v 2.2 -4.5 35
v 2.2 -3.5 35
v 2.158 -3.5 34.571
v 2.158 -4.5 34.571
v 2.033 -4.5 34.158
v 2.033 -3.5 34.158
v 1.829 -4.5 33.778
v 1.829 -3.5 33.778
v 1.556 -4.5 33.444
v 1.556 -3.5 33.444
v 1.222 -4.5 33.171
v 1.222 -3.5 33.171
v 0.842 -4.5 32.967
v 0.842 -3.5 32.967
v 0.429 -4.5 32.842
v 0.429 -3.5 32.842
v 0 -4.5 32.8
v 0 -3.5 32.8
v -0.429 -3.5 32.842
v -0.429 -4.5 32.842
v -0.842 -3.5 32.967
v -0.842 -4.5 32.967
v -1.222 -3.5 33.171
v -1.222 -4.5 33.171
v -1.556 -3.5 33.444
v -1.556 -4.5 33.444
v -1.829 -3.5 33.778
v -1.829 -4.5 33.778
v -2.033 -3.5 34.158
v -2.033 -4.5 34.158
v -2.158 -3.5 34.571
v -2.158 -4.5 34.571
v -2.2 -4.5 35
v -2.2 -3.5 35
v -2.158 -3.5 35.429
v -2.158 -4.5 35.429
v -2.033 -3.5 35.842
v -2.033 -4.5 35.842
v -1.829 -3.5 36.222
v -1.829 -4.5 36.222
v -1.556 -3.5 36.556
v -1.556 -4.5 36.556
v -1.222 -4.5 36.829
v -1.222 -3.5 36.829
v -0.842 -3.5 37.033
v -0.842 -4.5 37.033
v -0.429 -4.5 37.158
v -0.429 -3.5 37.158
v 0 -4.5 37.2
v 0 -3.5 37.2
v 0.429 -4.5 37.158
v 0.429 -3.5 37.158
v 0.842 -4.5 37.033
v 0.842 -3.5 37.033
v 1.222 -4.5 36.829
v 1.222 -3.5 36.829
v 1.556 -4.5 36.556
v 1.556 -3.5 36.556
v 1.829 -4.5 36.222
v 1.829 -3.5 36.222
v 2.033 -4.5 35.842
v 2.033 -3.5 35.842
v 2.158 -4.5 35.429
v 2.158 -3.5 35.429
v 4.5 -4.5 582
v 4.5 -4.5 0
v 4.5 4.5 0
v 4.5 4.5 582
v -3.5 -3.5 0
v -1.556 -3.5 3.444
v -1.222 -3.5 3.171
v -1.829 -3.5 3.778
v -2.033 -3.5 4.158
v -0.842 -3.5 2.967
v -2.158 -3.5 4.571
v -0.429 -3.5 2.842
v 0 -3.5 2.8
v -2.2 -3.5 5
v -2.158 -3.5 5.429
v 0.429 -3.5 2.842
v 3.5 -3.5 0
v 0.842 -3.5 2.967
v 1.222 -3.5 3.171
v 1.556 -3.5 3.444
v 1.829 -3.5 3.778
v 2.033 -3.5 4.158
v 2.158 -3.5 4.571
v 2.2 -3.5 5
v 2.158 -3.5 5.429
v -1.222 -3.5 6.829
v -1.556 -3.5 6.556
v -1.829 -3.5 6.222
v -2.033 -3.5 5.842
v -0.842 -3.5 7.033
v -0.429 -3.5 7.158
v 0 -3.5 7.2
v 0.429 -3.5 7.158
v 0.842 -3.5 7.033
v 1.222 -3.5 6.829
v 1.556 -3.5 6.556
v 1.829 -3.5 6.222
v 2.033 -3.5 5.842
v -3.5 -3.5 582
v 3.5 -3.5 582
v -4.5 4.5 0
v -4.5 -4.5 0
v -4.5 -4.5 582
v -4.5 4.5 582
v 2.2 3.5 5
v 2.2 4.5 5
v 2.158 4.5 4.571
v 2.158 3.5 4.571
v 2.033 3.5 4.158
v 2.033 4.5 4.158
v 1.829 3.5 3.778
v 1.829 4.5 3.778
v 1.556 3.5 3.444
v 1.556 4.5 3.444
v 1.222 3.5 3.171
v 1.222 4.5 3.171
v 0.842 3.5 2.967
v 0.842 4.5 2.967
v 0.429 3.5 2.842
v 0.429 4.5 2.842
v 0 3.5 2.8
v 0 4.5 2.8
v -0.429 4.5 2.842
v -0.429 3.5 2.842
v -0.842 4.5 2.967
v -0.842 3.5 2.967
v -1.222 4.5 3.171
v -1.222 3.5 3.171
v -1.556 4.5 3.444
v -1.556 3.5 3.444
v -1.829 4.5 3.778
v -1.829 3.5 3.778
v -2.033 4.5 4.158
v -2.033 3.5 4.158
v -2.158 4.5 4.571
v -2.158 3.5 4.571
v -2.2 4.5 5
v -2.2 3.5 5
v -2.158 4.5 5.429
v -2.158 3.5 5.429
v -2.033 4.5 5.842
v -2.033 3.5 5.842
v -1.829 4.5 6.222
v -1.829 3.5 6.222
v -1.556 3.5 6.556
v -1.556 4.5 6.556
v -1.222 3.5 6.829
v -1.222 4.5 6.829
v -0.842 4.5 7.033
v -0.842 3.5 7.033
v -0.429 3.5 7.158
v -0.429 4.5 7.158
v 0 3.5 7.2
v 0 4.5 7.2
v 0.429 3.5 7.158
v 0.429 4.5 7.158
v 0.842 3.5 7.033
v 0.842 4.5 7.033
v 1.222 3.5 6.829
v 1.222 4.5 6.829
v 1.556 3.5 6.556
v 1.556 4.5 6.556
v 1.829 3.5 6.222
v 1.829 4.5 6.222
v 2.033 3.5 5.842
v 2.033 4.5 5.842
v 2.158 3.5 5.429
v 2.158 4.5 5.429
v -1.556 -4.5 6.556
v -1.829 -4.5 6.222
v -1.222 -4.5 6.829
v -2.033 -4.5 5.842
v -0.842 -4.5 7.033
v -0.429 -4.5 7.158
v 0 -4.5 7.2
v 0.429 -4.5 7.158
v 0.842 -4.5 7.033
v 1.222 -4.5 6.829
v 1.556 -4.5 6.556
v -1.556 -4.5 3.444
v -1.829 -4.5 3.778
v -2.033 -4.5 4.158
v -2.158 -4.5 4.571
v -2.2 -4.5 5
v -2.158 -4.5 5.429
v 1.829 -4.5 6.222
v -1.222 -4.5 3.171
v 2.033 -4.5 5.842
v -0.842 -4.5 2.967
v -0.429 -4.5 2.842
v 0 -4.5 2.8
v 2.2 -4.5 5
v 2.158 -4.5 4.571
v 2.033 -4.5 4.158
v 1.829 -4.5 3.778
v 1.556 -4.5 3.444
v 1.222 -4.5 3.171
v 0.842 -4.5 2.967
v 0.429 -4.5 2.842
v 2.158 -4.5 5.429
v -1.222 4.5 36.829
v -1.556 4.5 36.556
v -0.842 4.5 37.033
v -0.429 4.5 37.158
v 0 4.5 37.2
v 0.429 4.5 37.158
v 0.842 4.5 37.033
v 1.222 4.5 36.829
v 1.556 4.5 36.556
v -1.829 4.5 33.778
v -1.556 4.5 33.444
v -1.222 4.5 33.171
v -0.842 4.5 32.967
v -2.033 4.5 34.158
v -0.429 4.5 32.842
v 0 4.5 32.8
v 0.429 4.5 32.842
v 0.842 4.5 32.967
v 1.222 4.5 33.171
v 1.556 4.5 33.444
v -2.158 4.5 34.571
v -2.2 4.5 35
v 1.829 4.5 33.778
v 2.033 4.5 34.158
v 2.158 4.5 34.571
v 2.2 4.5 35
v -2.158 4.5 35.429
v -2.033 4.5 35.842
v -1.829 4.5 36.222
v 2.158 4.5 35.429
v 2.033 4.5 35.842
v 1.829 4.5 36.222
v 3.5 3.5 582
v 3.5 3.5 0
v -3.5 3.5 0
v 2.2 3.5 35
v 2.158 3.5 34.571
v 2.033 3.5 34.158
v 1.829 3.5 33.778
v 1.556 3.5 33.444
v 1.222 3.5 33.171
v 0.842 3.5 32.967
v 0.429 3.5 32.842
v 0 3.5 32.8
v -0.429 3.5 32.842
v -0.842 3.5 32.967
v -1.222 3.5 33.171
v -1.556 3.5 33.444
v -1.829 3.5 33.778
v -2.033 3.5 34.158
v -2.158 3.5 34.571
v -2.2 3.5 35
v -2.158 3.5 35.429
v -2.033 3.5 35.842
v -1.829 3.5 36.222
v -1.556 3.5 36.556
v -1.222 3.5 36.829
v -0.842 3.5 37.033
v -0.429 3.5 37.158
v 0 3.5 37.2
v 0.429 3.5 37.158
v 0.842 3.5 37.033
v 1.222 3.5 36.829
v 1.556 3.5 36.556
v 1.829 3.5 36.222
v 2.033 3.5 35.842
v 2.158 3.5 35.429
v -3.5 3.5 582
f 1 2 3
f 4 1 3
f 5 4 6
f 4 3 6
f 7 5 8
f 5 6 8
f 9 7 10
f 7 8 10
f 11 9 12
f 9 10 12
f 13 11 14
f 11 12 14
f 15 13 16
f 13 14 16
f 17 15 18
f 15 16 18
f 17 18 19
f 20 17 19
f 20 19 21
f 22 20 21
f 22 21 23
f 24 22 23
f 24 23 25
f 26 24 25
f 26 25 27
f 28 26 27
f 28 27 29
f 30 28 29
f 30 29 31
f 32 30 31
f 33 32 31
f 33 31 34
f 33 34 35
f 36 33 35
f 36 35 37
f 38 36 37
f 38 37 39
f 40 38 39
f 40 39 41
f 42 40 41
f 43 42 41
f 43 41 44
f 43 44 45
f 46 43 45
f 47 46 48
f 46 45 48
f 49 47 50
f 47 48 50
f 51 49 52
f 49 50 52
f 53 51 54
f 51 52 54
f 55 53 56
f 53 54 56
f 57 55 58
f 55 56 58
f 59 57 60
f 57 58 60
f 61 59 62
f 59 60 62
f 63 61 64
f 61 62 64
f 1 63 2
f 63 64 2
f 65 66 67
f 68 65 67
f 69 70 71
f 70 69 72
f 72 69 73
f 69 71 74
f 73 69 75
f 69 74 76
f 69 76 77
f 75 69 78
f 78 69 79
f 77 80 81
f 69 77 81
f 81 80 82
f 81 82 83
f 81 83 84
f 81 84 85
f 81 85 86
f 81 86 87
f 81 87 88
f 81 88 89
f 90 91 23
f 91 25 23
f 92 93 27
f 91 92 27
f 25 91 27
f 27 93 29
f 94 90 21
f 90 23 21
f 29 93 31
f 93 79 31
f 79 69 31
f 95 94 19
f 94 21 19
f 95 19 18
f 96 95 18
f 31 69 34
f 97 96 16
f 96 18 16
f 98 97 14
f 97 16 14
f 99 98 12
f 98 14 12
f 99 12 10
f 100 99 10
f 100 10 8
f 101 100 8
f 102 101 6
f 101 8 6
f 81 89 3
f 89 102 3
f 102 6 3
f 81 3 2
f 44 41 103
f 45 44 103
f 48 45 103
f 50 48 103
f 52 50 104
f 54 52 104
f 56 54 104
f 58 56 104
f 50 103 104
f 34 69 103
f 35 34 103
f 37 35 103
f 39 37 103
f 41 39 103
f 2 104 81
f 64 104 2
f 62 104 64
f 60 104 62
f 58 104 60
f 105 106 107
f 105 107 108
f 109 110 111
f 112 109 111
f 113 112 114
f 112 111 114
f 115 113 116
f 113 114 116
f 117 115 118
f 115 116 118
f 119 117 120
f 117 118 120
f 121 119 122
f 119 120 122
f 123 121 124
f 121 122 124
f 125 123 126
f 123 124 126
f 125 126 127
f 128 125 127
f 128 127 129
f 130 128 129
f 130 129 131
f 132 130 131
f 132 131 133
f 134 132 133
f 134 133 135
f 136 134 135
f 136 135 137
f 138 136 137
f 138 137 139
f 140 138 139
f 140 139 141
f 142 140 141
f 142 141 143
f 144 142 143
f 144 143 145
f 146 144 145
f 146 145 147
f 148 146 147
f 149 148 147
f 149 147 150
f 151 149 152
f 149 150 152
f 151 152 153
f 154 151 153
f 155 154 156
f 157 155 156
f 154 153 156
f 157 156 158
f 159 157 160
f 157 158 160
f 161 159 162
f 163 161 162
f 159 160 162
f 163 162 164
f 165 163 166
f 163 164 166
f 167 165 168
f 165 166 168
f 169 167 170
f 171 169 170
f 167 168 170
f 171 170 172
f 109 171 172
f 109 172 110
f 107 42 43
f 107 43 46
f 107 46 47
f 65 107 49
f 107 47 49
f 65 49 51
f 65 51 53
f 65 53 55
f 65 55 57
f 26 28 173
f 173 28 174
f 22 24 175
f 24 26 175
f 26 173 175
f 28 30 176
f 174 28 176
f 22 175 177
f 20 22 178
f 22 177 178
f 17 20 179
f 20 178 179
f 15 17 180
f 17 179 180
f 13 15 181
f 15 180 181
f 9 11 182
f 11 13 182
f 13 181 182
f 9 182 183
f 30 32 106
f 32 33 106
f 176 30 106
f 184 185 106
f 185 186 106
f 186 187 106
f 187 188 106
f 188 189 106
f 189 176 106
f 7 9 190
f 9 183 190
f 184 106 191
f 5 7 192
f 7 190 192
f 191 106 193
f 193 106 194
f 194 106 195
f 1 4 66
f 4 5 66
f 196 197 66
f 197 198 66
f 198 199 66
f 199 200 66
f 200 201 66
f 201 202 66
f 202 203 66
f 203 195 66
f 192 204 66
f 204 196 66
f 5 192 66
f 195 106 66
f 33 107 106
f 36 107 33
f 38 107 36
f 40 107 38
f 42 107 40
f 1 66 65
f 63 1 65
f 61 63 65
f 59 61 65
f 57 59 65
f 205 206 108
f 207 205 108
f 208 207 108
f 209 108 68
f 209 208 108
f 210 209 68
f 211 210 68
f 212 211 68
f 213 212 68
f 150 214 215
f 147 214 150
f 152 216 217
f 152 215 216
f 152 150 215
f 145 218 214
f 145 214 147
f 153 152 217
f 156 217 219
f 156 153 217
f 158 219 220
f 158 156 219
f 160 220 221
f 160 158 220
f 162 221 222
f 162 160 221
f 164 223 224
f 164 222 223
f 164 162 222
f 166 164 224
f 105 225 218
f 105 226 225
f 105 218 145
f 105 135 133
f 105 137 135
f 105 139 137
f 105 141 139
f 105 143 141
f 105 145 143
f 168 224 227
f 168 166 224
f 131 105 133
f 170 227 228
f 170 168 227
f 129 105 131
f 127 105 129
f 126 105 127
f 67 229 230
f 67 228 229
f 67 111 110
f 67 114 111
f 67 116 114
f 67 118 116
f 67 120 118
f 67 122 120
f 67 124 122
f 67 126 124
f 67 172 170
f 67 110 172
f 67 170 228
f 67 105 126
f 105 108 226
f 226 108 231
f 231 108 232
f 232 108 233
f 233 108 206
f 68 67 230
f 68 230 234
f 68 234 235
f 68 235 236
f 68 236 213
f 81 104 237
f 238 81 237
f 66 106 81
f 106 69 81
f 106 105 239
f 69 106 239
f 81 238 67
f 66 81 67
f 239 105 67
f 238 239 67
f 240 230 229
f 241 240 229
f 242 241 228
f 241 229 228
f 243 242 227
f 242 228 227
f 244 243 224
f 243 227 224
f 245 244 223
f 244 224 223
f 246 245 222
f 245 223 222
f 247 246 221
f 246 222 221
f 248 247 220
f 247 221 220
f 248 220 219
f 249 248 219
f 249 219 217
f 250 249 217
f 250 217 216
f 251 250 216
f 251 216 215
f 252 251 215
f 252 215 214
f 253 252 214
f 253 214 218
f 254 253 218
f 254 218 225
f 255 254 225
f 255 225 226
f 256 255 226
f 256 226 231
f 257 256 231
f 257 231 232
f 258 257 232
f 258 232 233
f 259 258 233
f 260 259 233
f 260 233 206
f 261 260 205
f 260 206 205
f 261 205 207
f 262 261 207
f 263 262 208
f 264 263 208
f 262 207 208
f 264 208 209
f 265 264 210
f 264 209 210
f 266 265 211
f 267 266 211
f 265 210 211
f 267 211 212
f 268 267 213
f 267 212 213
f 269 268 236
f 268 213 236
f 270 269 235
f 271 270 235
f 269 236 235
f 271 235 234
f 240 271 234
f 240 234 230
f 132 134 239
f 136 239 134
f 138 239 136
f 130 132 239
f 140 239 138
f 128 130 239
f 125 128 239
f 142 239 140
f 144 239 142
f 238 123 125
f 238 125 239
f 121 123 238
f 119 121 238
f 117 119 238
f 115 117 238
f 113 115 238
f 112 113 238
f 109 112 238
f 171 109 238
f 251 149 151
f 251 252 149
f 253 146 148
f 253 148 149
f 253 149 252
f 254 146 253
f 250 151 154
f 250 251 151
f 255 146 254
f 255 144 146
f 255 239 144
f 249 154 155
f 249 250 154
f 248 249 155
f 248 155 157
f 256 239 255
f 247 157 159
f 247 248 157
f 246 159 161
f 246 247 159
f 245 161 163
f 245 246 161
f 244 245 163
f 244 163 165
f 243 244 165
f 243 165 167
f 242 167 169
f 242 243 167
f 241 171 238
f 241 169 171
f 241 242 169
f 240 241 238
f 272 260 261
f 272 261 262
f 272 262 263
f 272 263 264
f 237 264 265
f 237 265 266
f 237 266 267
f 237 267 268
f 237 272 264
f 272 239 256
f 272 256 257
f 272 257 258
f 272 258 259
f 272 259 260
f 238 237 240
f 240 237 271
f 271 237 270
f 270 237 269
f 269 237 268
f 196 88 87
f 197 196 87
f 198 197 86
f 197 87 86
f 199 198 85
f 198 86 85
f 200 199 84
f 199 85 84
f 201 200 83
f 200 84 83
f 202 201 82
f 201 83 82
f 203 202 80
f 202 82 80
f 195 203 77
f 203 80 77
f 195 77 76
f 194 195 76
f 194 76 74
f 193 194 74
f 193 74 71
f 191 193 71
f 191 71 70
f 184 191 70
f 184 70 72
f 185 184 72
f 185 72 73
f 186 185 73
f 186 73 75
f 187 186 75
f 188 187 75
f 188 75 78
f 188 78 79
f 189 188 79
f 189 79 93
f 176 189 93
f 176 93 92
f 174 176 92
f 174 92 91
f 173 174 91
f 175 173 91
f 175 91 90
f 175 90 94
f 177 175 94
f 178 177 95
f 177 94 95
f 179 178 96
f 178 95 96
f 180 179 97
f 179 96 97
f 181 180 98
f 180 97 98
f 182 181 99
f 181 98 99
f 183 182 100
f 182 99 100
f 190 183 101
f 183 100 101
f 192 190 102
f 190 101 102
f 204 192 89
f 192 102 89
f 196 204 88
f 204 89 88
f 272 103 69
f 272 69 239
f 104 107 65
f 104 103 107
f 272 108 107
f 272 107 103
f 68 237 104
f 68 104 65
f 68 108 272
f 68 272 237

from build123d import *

# Parameters (mm, degrees)
SKETCH_1_W          = 9
SKETCH_1_H          = 9
EXTRUDE_1_DEPTH     = 582
SKETCH_2_W          = 7
SKETCH_2_H          = 7
CUT_EXTRUDE_1_DEPTH = 582
SKETCH_3_R          = 2.2
CUT_EXTRUDE_2_DEPTH = 582


with BuildPart() as part:
    # ｽｹｯﾁ1 → ﾎﾞｽ - 押し出し1 (new body)
    with BuildSketch(Plane.XY):
        Rectangle(SKETCH_1_W, SKETCH_1_H)
    extrude(amount=EXTRUDE_1_DEPTH)

    # ｽｹｯﾁ2 → ｶｯﾄ - 押し出し1 (cut)
    with BuildSketch(Plane.XY.offset(582)):
        Rectangle(SKETCH_2_W, SKETCH_2_H)
    extrude(amount=-CUT_EXTRUDE_1_DEPTH, mode=Mode.SUBTRACT)

    # ｽｹｯﾁ3 → ｶｯﾄ - 押し出し2 (cut)
    with BuildSketch(Plane(origin=(0, 4.5, 0), x_dir=(1, 0, 0), z_dir=(0, 1, 0))):
        with Locations((0, -5)):
            Circle(SKETCH_3_R)
        with Locations((0, -35)):
            Circle(SKETCH_3_R)
    extrude(amount=-CUT_EXTRUDE_2_DEPTH, mode=Mode.SUBTRACT)


solid = part.part
